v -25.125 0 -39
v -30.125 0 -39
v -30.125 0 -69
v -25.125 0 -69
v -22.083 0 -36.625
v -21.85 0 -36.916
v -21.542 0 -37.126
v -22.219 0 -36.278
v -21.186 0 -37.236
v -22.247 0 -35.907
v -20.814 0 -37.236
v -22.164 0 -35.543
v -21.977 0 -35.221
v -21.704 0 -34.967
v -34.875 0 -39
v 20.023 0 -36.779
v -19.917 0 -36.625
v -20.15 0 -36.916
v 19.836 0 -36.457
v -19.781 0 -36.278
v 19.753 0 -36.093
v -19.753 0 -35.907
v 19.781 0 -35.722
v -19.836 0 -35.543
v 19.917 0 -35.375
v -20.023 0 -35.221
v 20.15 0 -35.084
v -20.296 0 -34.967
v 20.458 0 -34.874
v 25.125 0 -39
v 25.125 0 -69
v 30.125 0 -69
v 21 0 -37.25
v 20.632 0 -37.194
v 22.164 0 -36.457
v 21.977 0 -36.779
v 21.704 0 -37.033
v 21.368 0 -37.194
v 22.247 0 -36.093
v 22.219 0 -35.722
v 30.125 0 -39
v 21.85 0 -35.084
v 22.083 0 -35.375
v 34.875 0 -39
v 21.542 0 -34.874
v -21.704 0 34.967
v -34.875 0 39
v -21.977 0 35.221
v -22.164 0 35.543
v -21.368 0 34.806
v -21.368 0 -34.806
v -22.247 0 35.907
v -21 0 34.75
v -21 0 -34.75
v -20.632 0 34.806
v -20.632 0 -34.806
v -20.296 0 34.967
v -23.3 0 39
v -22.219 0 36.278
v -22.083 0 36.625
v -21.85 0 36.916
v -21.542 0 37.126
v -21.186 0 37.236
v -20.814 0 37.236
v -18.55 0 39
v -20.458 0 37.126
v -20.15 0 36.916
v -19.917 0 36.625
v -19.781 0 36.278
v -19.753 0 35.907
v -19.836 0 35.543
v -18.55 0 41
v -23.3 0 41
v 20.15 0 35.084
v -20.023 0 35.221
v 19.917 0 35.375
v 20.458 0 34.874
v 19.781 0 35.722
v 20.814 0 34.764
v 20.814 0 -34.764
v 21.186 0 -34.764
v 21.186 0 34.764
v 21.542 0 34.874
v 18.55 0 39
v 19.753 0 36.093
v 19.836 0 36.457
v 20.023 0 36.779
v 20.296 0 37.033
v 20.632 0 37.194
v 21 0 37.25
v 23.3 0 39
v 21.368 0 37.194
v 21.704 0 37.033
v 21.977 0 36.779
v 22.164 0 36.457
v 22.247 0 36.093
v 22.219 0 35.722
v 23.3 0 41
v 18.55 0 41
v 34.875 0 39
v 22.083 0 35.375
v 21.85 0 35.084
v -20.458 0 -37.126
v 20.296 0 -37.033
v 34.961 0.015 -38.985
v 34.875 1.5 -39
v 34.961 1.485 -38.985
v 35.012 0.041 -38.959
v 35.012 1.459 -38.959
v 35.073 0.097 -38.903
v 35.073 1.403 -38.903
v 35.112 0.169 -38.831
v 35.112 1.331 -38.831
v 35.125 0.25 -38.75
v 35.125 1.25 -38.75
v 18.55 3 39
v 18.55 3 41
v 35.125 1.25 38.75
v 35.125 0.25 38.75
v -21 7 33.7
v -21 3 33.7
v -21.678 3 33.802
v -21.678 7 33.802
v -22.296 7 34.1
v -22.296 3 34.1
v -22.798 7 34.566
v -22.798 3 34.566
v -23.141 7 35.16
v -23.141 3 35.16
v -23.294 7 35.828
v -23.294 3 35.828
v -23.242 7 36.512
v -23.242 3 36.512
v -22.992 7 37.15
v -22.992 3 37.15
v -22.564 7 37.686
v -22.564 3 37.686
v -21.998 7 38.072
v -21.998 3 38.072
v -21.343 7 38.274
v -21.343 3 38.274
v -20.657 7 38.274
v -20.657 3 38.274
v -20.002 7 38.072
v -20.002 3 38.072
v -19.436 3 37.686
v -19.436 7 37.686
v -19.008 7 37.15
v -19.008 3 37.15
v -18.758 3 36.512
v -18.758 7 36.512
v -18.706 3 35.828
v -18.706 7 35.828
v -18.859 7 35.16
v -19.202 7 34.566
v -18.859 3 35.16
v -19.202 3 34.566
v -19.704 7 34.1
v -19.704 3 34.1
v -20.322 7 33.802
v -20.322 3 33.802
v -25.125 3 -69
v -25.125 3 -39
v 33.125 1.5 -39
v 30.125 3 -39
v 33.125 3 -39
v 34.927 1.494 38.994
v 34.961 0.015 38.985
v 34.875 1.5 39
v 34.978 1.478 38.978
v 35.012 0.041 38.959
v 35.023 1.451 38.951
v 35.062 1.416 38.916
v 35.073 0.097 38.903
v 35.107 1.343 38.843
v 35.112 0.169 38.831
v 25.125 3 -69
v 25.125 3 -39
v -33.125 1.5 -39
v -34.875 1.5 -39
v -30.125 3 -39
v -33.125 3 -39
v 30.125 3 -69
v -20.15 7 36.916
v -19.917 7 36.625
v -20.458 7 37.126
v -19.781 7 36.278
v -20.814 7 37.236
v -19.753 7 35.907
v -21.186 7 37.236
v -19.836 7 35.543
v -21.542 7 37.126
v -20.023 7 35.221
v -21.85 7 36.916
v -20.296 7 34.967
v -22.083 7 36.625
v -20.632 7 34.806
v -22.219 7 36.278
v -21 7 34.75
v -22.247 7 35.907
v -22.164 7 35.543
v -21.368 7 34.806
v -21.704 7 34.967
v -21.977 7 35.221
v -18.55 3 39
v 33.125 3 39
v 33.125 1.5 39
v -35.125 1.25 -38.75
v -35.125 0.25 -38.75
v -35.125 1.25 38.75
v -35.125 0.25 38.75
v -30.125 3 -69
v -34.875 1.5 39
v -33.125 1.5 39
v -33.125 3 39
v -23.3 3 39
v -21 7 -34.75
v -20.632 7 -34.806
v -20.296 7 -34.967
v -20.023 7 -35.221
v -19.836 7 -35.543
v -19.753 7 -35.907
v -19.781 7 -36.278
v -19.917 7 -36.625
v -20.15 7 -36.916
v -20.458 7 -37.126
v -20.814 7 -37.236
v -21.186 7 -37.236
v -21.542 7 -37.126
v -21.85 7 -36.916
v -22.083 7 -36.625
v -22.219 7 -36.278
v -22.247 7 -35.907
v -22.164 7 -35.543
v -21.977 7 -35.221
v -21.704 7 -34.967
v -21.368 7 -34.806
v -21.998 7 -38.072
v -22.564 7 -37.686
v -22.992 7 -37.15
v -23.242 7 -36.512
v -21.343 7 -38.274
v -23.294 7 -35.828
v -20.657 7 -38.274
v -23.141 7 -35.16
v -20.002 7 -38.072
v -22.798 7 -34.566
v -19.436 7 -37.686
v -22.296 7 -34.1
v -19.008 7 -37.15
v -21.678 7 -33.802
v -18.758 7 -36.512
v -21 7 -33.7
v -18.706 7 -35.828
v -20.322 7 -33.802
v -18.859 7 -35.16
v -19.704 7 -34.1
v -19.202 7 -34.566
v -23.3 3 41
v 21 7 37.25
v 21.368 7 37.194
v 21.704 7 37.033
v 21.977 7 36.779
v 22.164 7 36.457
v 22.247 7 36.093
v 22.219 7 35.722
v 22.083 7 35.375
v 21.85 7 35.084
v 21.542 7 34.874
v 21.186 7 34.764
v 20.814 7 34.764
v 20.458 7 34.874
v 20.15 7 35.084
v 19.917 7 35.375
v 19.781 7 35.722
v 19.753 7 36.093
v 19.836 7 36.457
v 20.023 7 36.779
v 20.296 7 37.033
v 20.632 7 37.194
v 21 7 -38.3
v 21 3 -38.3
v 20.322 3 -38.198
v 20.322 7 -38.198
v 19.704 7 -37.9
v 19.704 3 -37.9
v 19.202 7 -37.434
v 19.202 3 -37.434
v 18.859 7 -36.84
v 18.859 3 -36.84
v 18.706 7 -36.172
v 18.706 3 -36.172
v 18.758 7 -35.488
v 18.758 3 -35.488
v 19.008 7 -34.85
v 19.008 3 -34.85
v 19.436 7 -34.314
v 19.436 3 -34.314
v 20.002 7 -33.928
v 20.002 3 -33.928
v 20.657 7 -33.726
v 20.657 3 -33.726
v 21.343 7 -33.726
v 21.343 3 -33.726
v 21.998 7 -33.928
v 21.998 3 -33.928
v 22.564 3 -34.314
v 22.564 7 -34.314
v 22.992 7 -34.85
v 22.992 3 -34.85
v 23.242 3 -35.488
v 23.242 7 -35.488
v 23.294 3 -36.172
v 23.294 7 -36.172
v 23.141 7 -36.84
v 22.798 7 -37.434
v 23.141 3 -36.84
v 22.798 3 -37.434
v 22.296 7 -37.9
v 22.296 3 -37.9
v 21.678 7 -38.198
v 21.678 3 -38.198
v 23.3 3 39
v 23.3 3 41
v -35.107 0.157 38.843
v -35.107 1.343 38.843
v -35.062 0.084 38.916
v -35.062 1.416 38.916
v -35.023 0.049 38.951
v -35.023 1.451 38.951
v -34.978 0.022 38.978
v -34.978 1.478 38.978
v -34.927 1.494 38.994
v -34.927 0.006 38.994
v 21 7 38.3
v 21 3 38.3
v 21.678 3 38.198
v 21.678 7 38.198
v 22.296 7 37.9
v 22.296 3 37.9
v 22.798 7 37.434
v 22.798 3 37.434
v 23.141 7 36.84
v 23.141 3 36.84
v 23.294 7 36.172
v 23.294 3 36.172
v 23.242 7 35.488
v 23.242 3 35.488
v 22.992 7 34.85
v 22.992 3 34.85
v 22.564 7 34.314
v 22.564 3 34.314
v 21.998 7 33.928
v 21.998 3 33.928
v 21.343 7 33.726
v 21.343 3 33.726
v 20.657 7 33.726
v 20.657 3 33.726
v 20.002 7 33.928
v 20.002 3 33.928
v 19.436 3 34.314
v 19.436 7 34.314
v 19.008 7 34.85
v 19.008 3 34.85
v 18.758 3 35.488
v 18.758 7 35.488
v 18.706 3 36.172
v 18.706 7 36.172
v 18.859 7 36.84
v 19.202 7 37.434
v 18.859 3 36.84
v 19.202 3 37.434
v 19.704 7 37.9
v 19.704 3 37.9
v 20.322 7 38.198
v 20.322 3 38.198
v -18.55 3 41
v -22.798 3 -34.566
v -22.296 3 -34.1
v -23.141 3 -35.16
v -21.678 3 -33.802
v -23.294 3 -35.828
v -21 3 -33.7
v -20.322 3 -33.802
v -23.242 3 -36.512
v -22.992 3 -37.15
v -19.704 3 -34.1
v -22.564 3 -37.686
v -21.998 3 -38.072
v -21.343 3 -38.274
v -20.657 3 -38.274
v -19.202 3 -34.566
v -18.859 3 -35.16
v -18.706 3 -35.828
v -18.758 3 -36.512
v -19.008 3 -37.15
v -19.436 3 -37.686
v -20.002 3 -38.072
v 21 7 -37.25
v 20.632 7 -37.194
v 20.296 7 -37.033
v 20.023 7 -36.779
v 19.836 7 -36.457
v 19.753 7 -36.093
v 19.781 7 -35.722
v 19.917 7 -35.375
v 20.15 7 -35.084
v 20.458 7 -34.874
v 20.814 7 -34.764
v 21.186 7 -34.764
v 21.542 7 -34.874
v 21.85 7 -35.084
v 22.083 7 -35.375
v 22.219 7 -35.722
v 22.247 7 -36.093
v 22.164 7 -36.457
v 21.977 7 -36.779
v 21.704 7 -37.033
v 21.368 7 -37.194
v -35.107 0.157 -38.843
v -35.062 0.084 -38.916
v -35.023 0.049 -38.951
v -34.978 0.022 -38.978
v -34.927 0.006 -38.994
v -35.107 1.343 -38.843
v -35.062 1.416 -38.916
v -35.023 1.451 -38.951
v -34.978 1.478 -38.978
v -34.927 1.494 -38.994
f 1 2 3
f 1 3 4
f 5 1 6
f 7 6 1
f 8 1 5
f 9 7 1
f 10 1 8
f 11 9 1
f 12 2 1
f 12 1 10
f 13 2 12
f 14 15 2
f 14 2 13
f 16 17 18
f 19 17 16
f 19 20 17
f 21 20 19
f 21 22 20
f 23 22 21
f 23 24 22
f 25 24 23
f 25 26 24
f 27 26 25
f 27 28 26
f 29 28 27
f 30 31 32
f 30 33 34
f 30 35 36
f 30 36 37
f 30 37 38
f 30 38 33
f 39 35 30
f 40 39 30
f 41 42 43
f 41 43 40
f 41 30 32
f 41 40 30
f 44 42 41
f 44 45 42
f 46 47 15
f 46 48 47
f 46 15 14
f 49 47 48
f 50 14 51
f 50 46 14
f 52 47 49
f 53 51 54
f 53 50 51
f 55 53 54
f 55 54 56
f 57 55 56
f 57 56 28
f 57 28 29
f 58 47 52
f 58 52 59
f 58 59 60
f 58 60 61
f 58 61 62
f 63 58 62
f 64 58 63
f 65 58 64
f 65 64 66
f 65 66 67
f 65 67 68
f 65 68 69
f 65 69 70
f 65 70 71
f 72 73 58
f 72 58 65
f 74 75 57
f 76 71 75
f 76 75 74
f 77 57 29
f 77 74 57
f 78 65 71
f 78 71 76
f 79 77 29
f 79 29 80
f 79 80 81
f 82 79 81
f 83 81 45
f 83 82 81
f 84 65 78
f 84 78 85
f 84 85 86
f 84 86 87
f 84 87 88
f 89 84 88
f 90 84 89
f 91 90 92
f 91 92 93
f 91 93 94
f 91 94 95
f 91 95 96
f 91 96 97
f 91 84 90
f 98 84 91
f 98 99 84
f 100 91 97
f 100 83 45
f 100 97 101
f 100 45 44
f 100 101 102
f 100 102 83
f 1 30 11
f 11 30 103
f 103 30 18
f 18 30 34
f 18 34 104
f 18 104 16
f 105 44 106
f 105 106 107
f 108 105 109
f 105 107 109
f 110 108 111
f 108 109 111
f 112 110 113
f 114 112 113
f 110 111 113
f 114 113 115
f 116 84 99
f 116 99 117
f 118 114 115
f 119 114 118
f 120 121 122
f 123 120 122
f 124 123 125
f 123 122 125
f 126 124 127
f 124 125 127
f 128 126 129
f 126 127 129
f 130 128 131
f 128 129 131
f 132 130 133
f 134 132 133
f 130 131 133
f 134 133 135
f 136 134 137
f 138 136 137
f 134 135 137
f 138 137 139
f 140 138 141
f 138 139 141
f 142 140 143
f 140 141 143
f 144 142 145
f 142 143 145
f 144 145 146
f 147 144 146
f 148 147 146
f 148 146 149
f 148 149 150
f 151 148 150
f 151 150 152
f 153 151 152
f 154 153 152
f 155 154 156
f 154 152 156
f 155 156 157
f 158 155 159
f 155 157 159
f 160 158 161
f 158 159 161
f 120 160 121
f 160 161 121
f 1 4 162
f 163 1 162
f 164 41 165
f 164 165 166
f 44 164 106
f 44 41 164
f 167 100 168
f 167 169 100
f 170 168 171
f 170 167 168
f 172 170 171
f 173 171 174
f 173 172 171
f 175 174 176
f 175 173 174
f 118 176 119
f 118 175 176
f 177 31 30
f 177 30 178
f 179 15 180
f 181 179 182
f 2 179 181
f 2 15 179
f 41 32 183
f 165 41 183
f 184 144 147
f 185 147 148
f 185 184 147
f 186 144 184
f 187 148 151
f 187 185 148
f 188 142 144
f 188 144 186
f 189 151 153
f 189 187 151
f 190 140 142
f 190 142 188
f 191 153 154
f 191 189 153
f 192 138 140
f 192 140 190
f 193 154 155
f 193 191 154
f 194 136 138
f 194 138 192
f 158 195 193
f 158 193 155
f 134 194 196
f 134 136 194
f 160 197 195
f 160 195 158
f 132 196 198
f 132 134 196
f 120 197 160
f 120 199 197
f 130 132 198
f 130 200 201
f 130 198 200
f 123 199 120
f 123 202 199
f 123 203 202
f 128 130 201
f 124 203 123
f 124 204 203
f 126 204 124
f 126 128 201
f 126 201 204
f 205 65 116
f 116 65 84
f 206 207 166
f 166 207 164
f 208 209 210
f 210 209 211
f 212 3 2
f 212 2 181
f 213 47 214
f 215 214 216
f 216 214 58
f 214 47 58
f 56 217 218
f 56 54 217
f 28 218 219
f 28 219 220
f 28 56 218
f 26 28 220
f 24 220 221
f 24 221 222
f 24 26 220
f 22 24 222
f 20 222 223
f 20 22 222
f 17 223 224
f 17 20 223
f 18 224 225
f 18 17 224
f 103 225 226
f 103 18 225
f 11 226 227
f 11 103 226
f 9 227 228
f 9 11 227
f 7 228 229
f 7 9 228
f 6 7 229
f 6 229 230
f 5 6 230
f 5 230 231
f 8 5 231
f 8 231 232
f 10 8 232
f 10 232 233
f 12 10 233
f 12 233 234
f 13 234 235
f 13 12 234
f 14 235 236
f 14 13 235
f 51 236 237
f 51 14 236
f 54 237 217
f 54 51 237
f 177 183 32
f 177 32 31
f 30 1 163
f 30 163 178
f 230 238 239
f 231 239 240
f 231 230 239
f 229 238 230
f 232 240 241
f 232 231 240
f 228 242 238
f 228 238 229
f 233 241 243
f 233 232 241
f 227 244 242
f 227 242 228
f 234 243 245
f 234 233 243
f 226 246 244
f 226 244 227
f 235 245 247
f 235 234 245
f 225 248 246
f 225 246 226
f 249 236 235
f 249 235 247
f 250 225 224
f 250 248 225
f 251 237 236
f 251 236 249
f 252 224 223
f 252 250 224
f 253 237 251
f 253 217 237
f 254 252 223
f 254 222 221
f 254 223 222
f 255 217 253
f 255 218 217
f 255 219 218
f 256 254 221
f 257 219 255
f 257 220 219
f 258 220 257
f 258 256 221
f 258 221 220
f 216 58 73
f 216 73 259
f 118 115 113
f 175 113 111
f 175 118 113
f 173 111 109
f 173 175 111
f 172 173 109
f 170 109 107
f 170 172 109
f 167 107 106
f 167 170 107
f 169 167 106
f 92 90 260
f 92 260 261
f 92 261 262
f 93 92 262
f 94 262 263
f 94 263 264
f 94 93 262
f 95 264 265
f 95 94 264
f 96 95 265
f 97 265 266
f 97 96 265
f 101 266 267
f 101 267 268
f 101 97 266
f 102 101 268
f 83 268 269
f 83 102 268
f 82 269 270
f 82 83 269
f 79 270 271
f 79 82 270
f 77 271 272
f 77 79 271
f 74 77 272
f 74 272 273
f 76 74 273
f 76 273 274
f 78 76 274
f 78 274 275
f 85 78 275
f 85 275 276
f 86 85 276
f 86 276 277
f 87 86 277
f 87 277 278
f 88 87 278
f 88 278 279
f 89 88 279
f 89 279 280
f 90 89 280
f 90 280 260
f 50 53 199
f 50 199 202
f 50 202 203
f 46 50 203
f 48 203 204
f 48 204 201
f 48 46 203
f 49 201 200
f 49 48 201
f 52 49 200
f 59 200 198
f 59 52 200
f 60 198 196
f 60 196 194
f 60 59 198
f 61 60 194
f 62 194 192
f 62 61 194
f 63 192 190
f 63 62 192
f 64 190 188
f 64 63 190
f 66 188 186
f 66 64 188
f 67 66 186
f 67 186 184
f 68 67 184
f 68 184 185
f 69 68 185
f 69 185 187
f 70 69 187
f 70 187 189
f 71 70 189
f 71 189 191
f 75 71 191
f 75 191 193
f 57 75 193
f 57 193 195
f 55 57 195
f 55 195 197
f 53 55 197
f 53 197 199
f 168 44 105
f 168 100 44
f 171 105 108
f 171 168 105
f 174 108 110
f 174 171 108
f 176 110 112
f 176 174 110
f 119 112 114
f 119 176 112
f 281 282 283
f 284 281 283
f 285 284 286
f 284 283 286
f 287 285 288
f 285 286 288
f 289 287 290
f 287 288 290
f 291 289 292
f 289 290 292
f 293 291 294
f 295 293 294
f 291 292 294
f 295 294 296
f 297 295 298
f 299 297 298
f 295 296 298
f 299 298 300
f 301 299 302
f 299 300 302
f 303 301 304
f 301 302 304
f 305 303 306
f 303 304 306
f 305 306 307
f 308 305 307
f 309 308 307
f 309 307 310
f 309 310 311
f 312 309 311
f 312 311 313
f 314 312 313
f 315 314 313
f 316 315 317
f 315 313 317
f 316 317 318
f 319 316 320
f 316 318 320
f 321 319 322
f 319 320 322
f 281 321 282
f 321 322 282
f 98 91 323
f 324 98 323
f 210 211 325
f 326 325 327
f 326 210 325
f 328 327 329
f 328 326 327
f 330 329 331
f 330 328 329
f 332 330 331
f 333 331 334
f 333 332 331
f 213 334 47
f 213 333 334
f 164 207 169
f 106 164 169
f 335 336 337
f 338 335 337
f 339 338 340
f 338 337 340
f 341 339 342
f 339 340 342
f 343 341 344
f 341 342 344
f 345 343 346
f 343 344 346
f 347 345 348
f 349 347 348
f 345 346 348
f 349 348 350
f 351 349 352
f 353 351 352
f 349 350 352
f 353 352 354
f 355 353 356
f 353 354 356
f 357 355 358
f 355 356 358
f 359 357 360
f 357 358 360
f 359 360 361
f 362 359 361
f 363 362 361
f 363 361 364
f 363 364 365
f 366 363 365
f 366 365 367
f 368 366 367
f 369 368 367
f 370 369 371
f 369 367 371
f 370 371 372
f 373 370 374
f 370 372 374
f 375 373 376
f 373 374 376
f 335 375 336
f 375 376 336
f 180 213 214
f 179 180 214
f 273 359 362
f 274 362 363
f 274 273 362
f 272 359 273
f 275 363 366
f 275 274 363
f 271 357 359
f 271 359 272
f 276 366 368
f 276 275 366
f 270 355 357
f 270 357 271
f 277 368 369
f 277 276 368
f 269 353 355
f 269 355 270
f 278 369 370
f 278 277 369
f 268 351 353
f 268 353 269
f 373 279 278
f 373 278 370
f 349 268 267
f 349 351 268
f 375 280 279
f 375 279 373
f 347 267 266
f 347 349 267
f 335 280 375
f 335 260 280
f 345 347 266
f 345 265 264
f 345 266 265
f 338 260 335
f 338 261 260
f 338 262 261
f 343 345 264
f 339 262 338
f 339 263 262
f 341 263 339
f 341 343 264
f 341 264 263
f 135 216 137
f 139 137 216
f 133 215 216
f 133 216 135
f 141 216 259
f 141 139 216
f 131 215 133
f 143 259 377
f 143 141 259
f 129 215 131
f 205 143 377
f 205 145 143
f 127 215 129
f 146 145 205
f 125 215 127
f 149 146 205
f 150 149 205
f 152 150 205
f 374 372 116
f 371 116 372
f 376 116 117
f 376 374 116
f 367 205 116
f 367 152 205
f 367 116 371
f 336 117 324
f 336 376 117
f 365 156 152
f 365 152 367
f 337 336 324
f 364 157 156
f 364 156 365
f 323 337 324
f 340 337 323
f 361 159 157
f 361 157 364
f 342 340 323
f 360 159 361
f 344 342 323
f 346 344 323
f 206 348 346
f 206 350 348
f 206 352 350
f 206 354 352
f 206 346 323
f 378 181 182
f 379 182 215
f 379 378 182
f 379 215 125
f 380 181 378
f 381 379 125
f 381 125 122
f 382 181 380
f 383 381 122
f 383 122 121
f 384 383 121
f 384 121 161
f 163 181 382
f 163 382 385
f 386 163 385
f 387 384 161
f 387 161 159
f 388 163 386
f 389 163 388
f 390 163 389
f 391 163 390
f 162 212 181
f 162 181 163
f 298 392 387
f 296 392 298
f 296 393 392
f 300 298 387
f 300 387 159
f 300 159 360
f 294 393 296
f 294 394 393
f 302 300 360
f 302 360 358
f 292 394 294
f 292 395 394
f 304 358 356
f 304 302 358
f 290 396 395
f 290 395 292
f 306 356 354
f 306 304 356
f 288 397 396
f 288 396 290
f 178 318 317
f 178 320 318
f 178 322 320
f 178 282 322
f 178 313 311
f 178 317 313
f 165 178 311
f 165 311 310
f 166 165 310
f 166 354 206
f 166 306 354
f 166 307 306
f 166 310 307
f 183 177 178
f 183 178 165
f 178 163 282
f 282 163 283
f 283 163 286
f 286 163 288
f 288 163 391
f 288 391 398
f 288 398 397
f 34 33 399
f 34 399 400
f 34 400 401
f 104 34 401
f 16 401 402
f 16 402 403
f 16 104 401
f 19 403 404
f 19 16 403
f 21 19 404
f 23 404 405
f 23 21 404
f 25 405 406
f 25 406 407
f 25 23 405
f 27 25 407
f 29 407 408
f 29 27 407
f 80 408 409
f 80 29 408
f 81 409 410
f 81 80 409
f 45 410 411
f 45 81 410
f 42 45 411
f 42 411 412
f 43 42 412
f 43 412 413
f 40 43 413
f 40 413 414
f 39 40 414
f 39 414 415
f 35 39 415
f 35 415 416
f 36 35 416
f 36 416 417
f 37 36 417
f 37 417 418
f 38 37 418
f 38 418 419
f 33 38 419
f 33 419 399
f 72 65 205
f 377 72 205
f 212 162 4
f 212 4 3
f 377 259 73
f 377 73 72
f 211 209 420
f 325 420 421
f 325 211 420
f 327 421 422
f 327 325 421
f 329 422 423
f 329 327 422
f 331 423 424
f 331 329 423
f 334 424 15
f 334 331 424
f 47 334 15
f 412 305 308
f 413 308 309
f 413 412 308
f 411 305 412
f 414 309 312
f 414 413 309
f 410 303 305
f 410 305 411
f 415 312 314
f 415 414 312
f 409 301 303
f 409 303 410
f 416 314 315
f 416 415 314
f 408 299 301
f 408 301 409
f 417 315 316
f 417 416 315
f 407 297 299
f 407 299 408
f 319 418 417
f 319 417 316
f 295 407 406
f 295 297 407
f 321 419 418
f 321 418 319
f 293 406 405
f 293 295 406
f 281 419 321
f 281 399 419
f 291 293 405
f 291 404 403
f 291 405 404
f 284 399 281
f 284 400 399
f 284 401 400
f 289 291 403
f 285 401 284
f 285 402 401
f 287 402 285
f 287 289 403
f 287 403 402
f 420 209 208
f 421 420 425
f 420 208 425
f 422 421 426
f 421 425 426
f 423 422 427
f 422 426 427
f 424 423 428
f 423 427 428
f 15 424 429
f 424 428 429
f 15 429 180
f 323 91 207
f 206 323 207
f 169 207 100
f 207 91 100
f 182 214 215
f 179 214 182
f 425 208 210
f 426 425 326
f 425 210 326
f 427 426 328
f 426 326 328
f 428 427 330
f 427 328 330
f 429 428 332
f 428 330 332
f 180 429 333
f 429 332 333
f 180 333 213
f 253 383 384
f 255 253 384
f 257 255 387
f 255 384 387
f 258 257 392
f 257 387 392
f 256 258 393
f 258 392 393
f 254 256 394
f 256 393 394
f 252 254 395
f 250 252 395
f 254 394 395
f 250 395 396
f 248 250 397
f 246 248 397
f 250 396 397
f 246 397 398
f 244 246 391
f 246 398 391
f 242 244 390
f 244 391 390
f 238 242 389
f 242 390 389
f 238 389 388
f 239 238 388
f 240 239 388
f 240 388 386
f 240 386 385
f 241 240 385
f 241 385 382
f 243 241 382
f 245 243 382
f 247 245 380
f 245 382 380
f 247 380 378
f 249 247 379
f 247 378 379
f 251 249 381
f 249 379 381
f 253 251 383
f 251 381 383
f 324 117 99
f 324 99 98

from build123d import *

# Parameters (mm, degrees)
SKETCH1_W           = 66.25
SKETCH1_H           = 78
SKETCH1_R           = 1.25
BOSS_EXTRUDE1_DEPTH = 3
SKETCH2_W           = 9.747388218
SKETCH2_H           = 78
SKETCH2_W_2         = 10.388237
BOSS_EXTRUDE2_DEPTH = 1.5
FILLET2_R           = 0.25
FILLET3_R           = 0.25
SKETCH3_R           = 2.3
SKETCH3_R_2         = 1.25
BOSS_EXTRUDE3_DEPTH = 4
SKETCH4_W           = 4.75
SKETCH4_H           = 3
BOSS_EXTRUDE4_DEPTH = 2
SKETCH5_W           = 5
SKETCH5_H           = 3
BOSS_EXTRUDE5_DEPTH = 30


with BuildPart() as part:
    # Sketch1 → Boss-Extrude1 (new body)
    with BuildSketch(Plane(origin=(0, 0, 0), x_dir=(1, 0, 0), z_dir=(0, 1, 0))):
        Rectangle(SKETCH1_W, SKETCH1_H)
        with Locations(Location((-21, 36, 0), (0, 0, 270))):
            Circle(SKETCH1_R, mode=Mode.SUBTRACT)
        with Locations(Location((21, 36, 0), (0, 0, 90))):
            Circle(SKETCH1_R, mode=Mode.SUBTRACT)
        with Locations(Location((21, -36, 0), (0, 0, 270))):
            Circle(SKETCH1_R, mode=Mode.SUBTRACT)
        with Locations(Location((-21, -36, 0), (0, 0, 90))):
            Circle(SKETCH1_R, mode=Mode.SUBTRACT)
    extrude(amount=BOSS_EXTRUDE1_DEPTH)

    # Sketch2 → Boss-Extrude2 (add)
    with BuildSketch(Plane.XZ):
        with Locations((-30.251305891, 0)):
            Rectangle(SKETCH2_W, SKETCH2_H)
        with Locations((29.9308815, 0)):
            Rectangle(SKETCH2_W_2, SKETCH2_H)
    extrude(amount=-BOSS_EXTRUDE2_DEPTH)

    # Fillet2
    fillet2_edges = [part.edges().sort_by_distance(p)[0] for p in [
        (-35.125, 0.75, 39),
        (-35.125, 0, 0),
        (-35.125, 1.5, 0),
        (-35.125, 0.75, -39),
    ]]
    fillet(fillet2_edges, radius=FILLET2_R)

    # Fillet3
    fillet3_edges = [part.edges().sort_by_distance(p)[0] for p in [
        (35.125, 0.75, -39),
        (35.125, 0, 0),
        (35.125, 1.5, 0),
        (35.125, 0.75, 39),
    ]]
    fillet(fillet3_edges, radius=FILLET3_R)

    # Sketch3 → Boss-Extrude3 (add)
    # profile 1 of 4: a face of its own
    with BuildSketch(Plane(origin=(0, 3, 0), x_dir=(1, 0, 0), z_dir=(0, 1, 0))):
        with Locations(Location((-21, 36, 0), (0, 0, 270))):
            Circle(SKETCH3_R)
        with Locations(Location((-21, 36, 0), (0, 0, 270))):
            Circle(SKETCH3_R_2, mode=Mode.SUBTRACT)
    # profile 2 of 4: a face of its own
    with BuildSketch(Plane(origin=(0, 3, 0), x_dir=(1, 0, 0), z_dir=(0, 1, 0))):
        with Locations(Location((21, 36, 0), (0, 0, 90))):
            Circle(SKETCH3_R)
        with Locations(Location((21, 36, 0), (0, 0, 90))):
            Circle(SKETCH3_R_2, mode=Mode.SUBTRACT)
    # profile 3 of 4: a face of its own
    with BuildSketch(Plane(origin=(0, 3, 0), x_dir=(1, 0, 0), z_dir=(0, 1, 0))):
        with Locations(Location((21, -36, 0), (0, 0, 270))):
            Circle(SKETCH3_R)
        with Locations(Location((21, -36, 0), (0, 0, 270))):
            Circle(SKETCH3_R_2, mode=Mode.SUBTRACT)
    # profile 4 of 4: a face of its own
    with BuildSketch(Plane(origin=(0, 3, 0), x_dir=(1, 0, 0), z_dir=(0, 1, 0))):
        with Locations(Location((-21, -36, 0), (0, 0, 90))):
            Circle(SKETCH3_R)
        with Locations(Location((-21, -36, 0), (0, 0, 90))):
            Circle(SKETCH3_R_2, mode=Mode.SUBTRACT)
    extrude(amount=BOSS_EXTRUDE3_DEPTH)

    # Sketch4 → Boss-Extrude4 (add)
    with BuildSketch(Plane.XY.offset(39)):
        with Locations((-20.925, 1.5)):
            Rectangle(SKETCH4_W, SKETCH4_H)
        with Locations((20.925, 1.5)):
            Rectangle(SKETCH4_W, SKETCH4_H)
    extrude(amount=BOSS_EXTRUDE4_DEPTH)

    # Sketch5 → Boss-Extrude5 (add)
    with BuildSketch(Plane(origin=(0, 0, -39), x_dir=(-1, 0, 0), z_dir=(0, 0, -1))):
        with Locations((-27.625, 1.5)):
            Rectangle(SKETCH5_W, SKETCH5_H)
        with Locations((27.625, 1.5)):
            Rectangle(SKETCH5_W, SKETCH5_H)
    extrude(amount=BOSS_EXTRUDE5_DEPTH)


solid = part.part
